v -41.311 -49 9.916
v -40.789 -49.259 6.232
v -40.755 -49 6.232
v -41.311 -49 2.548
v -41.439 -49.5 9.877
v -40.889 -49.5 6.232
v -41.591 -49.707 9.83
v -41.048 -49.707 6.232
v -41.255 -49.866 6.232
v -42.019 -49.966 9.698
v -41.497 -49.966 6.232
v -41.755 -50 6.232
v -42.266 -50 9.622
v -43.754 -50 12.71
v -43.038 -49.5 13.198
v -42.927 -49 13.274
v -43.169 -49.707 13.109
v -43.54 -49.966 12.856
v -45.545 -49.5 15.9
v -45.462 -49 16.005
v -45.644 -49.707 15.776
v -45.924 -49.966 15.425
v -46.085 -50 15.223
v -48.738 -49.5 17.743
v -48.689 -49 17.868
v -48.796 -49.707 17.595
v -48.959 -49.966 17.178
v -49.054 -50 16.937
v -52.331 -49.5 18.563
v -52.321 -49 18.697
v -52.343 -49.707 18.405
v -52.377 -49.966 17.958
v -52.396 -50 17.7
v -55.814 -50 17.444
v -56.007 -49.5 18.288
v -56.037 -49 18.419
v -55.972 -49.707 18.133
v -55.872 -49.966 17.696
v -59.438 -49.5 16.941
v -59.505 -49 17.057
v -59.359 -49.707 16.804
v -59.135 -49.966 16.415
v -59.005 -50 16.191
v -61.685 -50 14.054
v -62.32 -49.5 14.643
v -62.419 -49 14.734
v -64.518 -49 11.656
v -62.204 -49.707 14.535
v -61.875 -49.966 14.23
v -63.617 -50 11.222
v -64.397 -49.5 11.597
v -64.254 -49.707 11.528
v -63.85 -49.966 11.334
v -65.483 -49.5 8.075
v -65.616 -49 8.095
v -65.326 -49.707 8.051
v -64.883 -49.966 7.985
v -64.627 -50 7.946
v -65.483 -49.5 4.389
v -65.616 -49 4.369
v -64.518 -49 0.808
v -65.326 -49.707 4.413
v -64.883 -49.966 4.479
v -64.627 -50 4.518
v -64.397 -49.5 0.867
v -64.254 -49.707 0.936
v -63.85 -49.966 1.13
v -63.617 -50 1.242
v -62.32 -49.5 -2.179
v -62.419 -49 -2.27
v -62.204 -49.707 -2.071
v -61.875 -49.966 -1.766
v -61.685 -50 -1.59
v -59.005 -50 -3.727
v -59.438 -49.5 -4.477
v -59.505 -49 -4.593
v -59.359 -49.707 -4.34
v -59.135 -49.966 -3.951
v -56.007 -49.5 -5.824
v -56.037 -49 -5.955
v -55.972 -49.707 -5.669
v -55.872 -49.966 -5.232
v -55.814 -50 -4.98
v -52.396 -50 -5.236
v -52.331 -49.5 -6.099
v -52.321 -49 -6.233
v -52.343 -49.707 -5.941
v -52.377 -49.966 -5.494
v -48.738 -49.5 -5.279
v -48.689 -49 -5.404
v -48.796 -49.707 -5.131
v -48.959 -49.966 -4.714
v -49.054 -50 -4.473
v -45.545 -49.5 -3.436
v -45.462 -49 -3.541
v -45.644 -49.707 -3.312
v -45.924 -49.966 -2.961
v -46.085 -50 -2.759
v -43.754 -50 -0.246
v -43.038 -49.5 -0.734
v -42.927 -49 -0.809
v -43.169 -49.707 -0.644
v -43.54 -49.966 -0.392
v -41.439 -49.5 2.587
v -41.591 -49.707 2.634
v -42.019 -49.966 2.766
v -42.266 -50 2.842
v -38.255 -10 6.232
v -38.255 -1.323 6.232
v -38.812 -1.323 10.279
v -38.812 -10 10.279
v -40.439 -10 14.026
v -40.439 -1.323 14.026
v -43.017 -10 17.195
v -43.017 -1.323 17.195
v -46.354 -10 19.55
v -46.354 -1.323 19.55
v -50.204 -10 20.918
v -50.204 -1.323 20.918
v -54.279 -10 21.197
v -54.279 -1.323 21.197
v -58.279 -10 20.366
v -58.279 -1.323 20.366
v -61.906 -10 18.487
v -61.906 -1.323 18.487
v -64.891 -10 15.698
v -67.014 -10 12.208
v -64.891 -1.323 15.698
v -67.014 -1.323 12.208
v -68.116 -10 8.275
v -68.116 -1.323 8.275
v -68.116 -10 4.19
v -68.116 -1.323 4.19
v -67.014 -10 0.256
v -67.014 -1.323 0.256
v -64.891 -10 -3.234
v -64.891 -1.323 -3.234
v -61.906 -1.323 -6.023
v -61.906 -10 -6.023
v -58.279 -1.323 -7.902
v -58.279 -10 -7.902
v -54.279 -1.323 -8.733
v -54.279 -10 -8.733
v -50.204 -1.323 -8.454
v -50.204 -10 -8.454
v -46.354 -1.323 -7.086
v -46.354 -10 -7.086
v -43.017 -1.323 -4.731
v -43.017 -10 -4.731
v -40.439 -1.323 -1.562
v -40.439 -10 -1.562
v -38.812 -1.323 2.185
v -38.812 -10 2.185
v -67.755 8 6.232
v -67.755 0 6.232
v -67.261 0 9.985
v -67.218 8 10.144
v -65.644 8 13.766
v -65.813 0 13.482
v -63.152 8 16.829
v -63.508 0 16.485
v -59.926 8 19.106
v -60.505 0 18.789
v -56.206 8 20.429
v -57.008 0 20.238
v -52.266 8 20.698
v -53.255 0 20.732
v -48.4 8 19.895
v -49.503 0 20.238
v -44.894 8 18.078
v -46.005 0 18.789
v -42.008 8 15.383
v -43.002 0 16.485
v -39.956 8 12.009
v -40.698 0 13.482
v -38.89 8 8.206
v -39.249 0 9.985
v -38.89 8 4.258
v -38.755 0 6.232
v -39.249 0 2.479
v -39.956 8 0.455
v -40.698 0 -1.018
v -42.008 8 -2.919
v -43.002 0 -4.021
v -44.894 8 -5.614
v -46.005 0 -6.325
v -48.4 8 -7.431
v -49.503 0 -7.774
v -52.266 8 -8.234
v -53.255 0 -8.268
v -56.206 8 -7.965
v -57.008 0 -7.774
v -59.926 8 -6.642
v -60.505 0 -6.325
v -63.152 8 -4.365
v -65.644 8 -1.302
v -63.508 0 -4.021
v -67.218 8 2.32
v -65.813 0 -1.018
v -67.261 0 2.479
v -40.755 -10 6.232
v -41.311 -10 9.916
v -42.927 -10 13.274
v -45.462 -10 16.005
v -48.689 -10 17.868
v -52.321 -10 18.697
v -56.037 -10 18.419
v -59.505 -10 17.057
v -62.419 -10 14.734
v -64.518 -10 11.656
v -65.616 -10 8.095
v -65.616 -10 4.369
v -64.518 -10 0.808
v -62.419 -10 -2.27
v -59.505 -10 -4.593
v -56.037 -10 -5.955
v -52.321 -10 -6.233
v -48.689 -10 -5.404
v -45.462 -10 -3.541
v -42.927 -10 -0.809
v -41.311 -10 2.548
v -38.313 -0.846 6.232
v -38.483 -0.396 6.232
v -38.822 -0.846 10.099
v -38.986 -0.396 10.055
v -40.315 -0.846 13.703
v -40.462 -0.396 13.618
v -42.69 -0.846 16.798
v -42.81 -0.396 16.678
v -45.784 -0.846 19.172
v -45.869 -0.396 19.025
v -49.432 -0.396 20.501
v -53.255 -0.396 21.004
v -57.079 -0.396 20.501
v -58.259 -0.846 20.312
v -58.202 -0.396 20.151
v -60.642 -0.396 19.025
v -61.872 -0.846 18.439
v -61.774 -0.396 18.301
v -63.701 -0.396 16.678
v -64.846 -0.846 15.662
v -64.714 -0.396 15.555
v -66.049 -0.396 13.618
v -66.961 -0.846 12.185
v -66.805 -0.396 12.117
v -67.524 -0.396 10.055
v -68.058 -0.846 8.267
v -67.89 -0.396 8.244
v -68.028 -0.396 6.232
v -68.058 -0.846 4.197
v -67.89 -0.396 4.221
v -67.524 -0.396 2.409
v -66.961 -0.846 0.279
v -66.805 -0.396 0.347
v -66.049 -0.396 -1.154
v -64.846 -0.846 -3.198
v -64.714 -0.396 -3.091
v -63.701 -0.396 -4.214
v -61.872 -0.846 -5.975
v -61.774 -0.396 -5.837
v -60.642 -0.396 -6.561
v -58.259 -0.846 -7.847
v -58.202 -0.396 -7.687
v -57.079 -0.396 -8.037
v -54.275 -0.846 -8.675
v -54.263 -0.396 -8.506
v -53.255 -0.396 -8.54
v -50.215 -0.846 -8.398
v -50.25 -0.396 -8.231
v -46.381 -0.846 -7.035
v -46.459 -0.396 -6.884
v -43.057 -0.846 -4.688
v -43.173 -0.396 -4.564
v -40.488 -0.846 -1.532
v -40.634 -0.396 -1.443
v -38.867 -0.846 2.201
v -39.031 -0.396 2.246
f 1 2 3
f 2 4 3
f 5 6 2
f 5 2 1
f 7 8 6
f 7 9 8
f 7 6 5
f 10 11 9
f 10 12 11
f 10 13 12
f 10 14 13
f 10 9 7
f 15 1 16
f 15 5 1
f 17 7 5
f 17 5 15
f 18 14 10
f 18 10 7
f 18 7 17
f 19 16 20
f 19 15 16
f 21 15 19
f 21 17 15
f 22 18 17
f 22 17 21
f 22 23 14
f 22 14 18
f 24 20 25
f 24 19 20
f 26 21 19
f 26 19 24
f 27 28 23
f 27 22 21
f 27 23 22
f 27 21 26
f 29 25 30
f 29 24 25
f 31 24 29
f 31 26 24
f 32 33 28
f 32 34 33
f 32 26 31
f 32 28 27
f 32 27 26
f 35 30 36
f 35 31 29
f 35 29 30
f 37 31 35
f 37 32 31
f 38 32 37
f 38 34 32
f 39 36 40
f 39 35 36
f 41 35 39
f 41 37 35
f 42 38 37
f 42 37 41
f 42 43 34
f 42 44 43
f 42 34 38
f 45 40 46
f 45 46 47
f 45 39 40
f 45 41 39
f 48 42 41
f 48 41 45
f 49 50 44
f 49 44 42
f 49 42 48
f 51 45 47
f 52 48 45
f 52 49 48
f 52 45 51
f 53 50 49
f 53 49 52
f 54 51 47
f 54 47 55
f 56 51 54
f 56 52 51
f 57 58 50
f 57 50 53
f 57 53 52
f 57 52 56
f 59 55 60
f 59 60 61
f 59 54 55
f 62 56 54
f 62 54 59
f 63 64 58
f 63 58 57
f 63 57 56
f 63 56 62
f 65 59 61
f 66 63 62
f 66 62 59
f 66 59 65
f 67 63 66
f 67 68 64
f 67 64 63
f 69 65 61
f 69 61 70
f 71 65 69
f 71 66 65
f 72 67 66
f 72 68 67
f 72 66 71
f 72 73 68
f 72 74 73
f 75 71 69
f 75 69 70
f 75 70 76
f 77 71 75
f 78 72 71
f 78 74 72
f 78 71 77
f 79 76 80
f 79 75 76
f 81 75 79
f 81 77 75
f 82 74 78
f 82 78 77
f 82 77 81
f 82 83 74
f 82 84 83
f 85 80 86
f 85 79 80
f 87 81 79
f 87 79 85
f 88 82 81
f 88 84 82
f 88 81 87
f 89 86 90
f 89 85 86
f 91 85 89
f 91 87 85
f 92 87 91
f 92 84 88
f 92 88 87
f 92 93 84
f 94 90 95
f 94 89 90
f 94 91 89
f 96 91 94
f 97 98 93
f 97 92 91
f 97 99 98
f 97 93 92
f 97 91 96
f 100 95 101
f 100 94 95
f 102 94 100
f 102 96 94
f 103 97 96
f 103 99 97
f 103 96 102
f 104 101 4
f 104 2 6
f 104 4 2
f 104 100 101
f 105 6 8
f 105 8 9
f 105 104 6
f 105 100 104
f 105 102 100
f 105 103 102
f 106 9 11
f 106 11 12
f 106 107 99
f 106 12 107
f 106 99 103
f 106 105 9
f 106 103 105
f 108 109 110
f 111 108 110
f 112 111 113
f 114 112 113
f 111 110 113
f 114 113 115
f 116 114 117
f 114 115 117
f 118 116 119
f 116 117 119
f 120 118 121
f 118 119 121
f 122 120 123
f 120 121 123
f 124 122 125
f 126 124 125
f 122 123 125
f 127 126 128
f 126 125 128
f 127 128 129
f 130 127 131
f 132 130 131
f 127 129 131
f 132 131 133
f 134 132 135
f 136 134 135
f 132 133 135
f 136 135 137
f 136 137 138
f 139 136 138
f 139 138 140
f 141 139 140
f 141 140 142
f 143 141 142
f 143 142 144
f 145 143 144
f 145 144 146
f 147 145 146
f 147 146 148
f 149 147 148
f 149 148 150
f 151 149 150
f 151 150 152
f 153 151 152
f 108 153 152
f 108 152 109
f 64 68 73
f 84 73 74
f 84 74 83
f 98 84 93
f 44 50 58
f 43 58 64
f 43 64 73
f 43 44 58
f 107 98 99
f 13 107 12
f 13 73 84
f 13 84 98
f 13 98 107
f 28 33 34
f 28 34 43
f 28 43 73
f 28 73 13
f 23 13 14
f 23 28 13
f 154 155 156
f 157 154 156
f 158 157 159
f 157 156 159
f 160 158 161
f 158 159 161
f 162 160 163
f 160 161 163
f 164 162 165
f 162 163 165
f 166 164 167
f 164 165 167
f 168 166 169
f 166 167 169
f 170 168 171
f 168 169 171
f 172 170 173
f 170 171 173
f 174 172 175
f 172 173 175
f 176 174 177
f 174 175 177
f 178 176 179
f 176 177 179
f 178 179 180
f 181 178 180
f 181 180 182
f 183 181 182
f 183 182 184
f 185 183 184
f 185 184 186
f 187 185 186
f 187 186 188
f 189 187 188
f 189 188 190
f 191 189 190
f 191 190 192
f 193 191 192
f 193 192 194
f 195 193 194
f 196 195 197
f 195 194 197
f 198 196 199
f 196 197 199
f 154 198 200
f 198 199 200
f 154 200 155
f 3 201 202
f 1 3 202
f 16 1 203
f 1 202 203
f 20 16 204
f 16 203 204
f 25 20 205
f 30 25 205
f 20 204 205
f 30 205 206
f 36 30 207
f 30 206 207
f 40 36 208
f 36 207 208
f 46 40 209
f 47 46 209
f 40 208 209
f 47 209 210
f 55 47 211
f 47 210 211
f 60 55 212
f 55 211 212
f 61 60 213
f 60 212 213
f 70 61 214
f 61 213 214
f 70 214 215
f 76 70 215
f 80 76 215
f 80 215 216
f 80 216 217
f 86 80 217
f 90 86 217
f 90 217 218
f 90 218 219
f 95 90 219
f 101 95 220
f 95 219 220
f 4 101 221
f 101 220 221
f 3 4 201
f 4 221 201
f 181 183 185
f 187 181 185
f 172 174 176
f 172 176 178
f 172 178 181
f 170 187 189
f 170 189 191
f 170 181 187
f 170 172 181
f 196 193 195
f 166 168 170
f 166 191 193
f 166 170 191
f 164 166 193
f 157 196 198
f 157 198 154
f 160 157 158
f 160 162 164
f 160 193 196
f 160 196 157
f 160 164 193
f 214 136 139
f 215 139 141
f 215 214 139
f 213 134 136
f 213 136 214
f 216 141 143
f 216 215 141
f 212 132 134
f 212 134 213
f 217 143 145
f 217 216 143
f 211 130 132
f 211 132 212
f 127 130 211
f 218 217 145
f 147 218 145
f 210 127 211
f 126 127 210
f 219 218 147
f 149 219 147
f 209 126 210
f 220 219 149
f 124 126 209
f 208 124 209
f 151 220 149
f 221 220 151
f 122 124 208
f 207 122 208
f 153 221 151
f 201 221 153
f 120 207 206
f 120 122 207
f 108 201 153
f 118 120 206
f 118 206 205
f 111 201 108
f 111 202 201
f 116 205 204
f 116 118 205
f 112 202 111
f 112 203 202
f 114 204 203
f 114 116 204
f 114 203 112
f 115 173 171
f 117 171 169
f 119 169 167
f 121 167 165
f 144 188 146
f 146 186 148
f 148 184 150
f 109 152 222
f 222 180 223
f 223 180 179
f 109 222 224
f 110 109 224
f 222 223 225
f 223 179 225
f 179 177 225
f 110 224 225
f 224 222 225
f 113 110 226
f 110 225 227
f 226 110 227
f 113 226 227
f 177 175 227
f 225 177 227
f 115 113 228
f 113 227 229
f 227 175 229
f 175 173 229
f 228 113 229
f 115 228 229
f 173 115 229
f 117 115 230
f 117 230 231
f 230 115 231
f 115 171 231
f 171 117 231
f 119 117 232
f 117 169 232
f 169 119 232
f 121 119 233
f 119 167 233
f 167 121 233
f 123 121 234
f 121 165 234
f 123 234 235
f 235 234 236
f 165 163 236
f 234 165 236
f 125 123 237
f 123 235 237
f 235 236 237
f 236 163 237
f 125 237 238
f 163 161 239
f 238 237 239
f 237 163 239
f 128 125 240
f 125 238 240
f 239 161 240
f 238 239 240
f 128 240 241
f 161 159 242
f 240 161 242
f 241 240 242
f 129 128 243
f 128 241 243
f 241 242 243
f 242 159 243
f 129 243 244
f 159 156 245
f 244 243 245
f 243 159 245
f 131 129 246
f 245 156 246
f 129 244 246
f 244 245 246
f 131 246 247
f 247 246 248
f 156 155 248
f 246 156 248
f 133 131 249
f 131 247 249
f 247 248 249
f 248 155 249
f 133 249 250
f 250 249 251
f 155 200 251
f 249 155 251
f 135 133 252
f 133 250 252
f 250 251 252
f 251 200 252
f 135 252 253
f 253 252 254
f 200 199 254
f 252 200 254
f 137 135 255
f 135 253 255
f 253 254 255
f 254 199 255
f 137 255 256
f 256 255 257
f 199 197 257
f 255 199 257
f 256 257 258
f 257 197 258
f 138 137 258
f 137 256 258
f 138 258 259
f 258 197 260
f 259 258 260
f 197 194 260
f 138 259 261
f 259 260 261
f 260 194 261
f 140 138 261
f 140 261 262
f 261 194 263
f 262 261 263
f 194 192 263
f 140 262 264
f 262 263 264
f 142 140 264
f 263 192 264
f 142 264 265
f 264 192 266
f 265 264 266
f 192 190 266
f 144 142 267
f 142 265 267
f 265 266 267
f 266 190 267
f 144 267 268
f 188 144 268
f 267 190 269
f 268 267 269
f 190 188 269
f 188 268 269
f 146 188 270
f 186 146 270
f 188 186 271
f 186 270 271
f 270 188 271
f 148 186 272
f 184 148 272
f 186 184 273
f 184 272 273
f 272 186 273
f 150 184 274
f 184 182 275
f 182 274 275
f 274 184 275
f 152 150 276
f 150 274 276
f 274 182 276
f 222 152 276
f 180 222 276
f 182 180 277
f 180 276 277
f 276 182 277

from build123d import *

# Parameters (mm, degrees)
F0_R     = 15
F1_DEPTH = 10
F2_R     = 12.5
F3_DEPTH = 40
F4_R     = 1
F5_R     = 14.5
F6_DEPTH = 8


# Not quite as in the source:
# - a fillet or chamfer that OpenCascade refuses, or shapes differently, is made with other operations: its cross-section is extruded or revolved along the edge and cut away or added


with BuildPart() as f1:
    # F0 (on Front) → F1 (new body)
    with BuildSketch(Plane.XZ):
        with Locations((-53.2553978264, 6.2320148572)):
            Circle(F0_R)
    extrude(amount=F1_DEPTH)

    # F2 (on face) → F3 (join)
    with BuildSketch(Plane.XZ.offset(10)):
        with Locations((-53.2553978264, 6.2320148572)):
            Circle(F2_R)
    extrude(amount=F3_DEPTH)

    # F4
    f4_edges = [f1.edges().sort_by_distance(p)[0] for p in [
        (-65.755398, -50, 6.232015),
    ]]
    fillet(f4_edges, radius=F4_R)

    # F5 (on face) → F6 (join)
    with BuildSketch(Plane(origin=(0, 0, 0), x_dir=(-1, 0, 0), z_dir=(0, 1, 0))):
        with Locations((53.2553978264, 6.2320148572)):
            Circle(F5_R)
    extrude(amount=F6_DEPTH)

    # F7: fillet of radius 2 on 1 edges, made by hand

    # F7_s1 → F7_t2 (revolve, cut)
    with BuildSketch(Plane.XY.offset(6.2320148572)):
        with BuildLine():
            ThreePointArc((-38.2553978264, -1.3228756555), (-38.384569133, -0.6157688743), (-38.7553978264, 0))
            Line((-38.7553978264, 0), (-38.2553978264, 0))
            Line((-38.2553978264, 0), (-38.2553978264, -1.3228756555))
        make_face()
    revolve(axis=Axis((-53.2553978264, 0, 6.2320148572), (0, -1, 0)), mode=Mode.SUBTRACT)


solid = f1.part
